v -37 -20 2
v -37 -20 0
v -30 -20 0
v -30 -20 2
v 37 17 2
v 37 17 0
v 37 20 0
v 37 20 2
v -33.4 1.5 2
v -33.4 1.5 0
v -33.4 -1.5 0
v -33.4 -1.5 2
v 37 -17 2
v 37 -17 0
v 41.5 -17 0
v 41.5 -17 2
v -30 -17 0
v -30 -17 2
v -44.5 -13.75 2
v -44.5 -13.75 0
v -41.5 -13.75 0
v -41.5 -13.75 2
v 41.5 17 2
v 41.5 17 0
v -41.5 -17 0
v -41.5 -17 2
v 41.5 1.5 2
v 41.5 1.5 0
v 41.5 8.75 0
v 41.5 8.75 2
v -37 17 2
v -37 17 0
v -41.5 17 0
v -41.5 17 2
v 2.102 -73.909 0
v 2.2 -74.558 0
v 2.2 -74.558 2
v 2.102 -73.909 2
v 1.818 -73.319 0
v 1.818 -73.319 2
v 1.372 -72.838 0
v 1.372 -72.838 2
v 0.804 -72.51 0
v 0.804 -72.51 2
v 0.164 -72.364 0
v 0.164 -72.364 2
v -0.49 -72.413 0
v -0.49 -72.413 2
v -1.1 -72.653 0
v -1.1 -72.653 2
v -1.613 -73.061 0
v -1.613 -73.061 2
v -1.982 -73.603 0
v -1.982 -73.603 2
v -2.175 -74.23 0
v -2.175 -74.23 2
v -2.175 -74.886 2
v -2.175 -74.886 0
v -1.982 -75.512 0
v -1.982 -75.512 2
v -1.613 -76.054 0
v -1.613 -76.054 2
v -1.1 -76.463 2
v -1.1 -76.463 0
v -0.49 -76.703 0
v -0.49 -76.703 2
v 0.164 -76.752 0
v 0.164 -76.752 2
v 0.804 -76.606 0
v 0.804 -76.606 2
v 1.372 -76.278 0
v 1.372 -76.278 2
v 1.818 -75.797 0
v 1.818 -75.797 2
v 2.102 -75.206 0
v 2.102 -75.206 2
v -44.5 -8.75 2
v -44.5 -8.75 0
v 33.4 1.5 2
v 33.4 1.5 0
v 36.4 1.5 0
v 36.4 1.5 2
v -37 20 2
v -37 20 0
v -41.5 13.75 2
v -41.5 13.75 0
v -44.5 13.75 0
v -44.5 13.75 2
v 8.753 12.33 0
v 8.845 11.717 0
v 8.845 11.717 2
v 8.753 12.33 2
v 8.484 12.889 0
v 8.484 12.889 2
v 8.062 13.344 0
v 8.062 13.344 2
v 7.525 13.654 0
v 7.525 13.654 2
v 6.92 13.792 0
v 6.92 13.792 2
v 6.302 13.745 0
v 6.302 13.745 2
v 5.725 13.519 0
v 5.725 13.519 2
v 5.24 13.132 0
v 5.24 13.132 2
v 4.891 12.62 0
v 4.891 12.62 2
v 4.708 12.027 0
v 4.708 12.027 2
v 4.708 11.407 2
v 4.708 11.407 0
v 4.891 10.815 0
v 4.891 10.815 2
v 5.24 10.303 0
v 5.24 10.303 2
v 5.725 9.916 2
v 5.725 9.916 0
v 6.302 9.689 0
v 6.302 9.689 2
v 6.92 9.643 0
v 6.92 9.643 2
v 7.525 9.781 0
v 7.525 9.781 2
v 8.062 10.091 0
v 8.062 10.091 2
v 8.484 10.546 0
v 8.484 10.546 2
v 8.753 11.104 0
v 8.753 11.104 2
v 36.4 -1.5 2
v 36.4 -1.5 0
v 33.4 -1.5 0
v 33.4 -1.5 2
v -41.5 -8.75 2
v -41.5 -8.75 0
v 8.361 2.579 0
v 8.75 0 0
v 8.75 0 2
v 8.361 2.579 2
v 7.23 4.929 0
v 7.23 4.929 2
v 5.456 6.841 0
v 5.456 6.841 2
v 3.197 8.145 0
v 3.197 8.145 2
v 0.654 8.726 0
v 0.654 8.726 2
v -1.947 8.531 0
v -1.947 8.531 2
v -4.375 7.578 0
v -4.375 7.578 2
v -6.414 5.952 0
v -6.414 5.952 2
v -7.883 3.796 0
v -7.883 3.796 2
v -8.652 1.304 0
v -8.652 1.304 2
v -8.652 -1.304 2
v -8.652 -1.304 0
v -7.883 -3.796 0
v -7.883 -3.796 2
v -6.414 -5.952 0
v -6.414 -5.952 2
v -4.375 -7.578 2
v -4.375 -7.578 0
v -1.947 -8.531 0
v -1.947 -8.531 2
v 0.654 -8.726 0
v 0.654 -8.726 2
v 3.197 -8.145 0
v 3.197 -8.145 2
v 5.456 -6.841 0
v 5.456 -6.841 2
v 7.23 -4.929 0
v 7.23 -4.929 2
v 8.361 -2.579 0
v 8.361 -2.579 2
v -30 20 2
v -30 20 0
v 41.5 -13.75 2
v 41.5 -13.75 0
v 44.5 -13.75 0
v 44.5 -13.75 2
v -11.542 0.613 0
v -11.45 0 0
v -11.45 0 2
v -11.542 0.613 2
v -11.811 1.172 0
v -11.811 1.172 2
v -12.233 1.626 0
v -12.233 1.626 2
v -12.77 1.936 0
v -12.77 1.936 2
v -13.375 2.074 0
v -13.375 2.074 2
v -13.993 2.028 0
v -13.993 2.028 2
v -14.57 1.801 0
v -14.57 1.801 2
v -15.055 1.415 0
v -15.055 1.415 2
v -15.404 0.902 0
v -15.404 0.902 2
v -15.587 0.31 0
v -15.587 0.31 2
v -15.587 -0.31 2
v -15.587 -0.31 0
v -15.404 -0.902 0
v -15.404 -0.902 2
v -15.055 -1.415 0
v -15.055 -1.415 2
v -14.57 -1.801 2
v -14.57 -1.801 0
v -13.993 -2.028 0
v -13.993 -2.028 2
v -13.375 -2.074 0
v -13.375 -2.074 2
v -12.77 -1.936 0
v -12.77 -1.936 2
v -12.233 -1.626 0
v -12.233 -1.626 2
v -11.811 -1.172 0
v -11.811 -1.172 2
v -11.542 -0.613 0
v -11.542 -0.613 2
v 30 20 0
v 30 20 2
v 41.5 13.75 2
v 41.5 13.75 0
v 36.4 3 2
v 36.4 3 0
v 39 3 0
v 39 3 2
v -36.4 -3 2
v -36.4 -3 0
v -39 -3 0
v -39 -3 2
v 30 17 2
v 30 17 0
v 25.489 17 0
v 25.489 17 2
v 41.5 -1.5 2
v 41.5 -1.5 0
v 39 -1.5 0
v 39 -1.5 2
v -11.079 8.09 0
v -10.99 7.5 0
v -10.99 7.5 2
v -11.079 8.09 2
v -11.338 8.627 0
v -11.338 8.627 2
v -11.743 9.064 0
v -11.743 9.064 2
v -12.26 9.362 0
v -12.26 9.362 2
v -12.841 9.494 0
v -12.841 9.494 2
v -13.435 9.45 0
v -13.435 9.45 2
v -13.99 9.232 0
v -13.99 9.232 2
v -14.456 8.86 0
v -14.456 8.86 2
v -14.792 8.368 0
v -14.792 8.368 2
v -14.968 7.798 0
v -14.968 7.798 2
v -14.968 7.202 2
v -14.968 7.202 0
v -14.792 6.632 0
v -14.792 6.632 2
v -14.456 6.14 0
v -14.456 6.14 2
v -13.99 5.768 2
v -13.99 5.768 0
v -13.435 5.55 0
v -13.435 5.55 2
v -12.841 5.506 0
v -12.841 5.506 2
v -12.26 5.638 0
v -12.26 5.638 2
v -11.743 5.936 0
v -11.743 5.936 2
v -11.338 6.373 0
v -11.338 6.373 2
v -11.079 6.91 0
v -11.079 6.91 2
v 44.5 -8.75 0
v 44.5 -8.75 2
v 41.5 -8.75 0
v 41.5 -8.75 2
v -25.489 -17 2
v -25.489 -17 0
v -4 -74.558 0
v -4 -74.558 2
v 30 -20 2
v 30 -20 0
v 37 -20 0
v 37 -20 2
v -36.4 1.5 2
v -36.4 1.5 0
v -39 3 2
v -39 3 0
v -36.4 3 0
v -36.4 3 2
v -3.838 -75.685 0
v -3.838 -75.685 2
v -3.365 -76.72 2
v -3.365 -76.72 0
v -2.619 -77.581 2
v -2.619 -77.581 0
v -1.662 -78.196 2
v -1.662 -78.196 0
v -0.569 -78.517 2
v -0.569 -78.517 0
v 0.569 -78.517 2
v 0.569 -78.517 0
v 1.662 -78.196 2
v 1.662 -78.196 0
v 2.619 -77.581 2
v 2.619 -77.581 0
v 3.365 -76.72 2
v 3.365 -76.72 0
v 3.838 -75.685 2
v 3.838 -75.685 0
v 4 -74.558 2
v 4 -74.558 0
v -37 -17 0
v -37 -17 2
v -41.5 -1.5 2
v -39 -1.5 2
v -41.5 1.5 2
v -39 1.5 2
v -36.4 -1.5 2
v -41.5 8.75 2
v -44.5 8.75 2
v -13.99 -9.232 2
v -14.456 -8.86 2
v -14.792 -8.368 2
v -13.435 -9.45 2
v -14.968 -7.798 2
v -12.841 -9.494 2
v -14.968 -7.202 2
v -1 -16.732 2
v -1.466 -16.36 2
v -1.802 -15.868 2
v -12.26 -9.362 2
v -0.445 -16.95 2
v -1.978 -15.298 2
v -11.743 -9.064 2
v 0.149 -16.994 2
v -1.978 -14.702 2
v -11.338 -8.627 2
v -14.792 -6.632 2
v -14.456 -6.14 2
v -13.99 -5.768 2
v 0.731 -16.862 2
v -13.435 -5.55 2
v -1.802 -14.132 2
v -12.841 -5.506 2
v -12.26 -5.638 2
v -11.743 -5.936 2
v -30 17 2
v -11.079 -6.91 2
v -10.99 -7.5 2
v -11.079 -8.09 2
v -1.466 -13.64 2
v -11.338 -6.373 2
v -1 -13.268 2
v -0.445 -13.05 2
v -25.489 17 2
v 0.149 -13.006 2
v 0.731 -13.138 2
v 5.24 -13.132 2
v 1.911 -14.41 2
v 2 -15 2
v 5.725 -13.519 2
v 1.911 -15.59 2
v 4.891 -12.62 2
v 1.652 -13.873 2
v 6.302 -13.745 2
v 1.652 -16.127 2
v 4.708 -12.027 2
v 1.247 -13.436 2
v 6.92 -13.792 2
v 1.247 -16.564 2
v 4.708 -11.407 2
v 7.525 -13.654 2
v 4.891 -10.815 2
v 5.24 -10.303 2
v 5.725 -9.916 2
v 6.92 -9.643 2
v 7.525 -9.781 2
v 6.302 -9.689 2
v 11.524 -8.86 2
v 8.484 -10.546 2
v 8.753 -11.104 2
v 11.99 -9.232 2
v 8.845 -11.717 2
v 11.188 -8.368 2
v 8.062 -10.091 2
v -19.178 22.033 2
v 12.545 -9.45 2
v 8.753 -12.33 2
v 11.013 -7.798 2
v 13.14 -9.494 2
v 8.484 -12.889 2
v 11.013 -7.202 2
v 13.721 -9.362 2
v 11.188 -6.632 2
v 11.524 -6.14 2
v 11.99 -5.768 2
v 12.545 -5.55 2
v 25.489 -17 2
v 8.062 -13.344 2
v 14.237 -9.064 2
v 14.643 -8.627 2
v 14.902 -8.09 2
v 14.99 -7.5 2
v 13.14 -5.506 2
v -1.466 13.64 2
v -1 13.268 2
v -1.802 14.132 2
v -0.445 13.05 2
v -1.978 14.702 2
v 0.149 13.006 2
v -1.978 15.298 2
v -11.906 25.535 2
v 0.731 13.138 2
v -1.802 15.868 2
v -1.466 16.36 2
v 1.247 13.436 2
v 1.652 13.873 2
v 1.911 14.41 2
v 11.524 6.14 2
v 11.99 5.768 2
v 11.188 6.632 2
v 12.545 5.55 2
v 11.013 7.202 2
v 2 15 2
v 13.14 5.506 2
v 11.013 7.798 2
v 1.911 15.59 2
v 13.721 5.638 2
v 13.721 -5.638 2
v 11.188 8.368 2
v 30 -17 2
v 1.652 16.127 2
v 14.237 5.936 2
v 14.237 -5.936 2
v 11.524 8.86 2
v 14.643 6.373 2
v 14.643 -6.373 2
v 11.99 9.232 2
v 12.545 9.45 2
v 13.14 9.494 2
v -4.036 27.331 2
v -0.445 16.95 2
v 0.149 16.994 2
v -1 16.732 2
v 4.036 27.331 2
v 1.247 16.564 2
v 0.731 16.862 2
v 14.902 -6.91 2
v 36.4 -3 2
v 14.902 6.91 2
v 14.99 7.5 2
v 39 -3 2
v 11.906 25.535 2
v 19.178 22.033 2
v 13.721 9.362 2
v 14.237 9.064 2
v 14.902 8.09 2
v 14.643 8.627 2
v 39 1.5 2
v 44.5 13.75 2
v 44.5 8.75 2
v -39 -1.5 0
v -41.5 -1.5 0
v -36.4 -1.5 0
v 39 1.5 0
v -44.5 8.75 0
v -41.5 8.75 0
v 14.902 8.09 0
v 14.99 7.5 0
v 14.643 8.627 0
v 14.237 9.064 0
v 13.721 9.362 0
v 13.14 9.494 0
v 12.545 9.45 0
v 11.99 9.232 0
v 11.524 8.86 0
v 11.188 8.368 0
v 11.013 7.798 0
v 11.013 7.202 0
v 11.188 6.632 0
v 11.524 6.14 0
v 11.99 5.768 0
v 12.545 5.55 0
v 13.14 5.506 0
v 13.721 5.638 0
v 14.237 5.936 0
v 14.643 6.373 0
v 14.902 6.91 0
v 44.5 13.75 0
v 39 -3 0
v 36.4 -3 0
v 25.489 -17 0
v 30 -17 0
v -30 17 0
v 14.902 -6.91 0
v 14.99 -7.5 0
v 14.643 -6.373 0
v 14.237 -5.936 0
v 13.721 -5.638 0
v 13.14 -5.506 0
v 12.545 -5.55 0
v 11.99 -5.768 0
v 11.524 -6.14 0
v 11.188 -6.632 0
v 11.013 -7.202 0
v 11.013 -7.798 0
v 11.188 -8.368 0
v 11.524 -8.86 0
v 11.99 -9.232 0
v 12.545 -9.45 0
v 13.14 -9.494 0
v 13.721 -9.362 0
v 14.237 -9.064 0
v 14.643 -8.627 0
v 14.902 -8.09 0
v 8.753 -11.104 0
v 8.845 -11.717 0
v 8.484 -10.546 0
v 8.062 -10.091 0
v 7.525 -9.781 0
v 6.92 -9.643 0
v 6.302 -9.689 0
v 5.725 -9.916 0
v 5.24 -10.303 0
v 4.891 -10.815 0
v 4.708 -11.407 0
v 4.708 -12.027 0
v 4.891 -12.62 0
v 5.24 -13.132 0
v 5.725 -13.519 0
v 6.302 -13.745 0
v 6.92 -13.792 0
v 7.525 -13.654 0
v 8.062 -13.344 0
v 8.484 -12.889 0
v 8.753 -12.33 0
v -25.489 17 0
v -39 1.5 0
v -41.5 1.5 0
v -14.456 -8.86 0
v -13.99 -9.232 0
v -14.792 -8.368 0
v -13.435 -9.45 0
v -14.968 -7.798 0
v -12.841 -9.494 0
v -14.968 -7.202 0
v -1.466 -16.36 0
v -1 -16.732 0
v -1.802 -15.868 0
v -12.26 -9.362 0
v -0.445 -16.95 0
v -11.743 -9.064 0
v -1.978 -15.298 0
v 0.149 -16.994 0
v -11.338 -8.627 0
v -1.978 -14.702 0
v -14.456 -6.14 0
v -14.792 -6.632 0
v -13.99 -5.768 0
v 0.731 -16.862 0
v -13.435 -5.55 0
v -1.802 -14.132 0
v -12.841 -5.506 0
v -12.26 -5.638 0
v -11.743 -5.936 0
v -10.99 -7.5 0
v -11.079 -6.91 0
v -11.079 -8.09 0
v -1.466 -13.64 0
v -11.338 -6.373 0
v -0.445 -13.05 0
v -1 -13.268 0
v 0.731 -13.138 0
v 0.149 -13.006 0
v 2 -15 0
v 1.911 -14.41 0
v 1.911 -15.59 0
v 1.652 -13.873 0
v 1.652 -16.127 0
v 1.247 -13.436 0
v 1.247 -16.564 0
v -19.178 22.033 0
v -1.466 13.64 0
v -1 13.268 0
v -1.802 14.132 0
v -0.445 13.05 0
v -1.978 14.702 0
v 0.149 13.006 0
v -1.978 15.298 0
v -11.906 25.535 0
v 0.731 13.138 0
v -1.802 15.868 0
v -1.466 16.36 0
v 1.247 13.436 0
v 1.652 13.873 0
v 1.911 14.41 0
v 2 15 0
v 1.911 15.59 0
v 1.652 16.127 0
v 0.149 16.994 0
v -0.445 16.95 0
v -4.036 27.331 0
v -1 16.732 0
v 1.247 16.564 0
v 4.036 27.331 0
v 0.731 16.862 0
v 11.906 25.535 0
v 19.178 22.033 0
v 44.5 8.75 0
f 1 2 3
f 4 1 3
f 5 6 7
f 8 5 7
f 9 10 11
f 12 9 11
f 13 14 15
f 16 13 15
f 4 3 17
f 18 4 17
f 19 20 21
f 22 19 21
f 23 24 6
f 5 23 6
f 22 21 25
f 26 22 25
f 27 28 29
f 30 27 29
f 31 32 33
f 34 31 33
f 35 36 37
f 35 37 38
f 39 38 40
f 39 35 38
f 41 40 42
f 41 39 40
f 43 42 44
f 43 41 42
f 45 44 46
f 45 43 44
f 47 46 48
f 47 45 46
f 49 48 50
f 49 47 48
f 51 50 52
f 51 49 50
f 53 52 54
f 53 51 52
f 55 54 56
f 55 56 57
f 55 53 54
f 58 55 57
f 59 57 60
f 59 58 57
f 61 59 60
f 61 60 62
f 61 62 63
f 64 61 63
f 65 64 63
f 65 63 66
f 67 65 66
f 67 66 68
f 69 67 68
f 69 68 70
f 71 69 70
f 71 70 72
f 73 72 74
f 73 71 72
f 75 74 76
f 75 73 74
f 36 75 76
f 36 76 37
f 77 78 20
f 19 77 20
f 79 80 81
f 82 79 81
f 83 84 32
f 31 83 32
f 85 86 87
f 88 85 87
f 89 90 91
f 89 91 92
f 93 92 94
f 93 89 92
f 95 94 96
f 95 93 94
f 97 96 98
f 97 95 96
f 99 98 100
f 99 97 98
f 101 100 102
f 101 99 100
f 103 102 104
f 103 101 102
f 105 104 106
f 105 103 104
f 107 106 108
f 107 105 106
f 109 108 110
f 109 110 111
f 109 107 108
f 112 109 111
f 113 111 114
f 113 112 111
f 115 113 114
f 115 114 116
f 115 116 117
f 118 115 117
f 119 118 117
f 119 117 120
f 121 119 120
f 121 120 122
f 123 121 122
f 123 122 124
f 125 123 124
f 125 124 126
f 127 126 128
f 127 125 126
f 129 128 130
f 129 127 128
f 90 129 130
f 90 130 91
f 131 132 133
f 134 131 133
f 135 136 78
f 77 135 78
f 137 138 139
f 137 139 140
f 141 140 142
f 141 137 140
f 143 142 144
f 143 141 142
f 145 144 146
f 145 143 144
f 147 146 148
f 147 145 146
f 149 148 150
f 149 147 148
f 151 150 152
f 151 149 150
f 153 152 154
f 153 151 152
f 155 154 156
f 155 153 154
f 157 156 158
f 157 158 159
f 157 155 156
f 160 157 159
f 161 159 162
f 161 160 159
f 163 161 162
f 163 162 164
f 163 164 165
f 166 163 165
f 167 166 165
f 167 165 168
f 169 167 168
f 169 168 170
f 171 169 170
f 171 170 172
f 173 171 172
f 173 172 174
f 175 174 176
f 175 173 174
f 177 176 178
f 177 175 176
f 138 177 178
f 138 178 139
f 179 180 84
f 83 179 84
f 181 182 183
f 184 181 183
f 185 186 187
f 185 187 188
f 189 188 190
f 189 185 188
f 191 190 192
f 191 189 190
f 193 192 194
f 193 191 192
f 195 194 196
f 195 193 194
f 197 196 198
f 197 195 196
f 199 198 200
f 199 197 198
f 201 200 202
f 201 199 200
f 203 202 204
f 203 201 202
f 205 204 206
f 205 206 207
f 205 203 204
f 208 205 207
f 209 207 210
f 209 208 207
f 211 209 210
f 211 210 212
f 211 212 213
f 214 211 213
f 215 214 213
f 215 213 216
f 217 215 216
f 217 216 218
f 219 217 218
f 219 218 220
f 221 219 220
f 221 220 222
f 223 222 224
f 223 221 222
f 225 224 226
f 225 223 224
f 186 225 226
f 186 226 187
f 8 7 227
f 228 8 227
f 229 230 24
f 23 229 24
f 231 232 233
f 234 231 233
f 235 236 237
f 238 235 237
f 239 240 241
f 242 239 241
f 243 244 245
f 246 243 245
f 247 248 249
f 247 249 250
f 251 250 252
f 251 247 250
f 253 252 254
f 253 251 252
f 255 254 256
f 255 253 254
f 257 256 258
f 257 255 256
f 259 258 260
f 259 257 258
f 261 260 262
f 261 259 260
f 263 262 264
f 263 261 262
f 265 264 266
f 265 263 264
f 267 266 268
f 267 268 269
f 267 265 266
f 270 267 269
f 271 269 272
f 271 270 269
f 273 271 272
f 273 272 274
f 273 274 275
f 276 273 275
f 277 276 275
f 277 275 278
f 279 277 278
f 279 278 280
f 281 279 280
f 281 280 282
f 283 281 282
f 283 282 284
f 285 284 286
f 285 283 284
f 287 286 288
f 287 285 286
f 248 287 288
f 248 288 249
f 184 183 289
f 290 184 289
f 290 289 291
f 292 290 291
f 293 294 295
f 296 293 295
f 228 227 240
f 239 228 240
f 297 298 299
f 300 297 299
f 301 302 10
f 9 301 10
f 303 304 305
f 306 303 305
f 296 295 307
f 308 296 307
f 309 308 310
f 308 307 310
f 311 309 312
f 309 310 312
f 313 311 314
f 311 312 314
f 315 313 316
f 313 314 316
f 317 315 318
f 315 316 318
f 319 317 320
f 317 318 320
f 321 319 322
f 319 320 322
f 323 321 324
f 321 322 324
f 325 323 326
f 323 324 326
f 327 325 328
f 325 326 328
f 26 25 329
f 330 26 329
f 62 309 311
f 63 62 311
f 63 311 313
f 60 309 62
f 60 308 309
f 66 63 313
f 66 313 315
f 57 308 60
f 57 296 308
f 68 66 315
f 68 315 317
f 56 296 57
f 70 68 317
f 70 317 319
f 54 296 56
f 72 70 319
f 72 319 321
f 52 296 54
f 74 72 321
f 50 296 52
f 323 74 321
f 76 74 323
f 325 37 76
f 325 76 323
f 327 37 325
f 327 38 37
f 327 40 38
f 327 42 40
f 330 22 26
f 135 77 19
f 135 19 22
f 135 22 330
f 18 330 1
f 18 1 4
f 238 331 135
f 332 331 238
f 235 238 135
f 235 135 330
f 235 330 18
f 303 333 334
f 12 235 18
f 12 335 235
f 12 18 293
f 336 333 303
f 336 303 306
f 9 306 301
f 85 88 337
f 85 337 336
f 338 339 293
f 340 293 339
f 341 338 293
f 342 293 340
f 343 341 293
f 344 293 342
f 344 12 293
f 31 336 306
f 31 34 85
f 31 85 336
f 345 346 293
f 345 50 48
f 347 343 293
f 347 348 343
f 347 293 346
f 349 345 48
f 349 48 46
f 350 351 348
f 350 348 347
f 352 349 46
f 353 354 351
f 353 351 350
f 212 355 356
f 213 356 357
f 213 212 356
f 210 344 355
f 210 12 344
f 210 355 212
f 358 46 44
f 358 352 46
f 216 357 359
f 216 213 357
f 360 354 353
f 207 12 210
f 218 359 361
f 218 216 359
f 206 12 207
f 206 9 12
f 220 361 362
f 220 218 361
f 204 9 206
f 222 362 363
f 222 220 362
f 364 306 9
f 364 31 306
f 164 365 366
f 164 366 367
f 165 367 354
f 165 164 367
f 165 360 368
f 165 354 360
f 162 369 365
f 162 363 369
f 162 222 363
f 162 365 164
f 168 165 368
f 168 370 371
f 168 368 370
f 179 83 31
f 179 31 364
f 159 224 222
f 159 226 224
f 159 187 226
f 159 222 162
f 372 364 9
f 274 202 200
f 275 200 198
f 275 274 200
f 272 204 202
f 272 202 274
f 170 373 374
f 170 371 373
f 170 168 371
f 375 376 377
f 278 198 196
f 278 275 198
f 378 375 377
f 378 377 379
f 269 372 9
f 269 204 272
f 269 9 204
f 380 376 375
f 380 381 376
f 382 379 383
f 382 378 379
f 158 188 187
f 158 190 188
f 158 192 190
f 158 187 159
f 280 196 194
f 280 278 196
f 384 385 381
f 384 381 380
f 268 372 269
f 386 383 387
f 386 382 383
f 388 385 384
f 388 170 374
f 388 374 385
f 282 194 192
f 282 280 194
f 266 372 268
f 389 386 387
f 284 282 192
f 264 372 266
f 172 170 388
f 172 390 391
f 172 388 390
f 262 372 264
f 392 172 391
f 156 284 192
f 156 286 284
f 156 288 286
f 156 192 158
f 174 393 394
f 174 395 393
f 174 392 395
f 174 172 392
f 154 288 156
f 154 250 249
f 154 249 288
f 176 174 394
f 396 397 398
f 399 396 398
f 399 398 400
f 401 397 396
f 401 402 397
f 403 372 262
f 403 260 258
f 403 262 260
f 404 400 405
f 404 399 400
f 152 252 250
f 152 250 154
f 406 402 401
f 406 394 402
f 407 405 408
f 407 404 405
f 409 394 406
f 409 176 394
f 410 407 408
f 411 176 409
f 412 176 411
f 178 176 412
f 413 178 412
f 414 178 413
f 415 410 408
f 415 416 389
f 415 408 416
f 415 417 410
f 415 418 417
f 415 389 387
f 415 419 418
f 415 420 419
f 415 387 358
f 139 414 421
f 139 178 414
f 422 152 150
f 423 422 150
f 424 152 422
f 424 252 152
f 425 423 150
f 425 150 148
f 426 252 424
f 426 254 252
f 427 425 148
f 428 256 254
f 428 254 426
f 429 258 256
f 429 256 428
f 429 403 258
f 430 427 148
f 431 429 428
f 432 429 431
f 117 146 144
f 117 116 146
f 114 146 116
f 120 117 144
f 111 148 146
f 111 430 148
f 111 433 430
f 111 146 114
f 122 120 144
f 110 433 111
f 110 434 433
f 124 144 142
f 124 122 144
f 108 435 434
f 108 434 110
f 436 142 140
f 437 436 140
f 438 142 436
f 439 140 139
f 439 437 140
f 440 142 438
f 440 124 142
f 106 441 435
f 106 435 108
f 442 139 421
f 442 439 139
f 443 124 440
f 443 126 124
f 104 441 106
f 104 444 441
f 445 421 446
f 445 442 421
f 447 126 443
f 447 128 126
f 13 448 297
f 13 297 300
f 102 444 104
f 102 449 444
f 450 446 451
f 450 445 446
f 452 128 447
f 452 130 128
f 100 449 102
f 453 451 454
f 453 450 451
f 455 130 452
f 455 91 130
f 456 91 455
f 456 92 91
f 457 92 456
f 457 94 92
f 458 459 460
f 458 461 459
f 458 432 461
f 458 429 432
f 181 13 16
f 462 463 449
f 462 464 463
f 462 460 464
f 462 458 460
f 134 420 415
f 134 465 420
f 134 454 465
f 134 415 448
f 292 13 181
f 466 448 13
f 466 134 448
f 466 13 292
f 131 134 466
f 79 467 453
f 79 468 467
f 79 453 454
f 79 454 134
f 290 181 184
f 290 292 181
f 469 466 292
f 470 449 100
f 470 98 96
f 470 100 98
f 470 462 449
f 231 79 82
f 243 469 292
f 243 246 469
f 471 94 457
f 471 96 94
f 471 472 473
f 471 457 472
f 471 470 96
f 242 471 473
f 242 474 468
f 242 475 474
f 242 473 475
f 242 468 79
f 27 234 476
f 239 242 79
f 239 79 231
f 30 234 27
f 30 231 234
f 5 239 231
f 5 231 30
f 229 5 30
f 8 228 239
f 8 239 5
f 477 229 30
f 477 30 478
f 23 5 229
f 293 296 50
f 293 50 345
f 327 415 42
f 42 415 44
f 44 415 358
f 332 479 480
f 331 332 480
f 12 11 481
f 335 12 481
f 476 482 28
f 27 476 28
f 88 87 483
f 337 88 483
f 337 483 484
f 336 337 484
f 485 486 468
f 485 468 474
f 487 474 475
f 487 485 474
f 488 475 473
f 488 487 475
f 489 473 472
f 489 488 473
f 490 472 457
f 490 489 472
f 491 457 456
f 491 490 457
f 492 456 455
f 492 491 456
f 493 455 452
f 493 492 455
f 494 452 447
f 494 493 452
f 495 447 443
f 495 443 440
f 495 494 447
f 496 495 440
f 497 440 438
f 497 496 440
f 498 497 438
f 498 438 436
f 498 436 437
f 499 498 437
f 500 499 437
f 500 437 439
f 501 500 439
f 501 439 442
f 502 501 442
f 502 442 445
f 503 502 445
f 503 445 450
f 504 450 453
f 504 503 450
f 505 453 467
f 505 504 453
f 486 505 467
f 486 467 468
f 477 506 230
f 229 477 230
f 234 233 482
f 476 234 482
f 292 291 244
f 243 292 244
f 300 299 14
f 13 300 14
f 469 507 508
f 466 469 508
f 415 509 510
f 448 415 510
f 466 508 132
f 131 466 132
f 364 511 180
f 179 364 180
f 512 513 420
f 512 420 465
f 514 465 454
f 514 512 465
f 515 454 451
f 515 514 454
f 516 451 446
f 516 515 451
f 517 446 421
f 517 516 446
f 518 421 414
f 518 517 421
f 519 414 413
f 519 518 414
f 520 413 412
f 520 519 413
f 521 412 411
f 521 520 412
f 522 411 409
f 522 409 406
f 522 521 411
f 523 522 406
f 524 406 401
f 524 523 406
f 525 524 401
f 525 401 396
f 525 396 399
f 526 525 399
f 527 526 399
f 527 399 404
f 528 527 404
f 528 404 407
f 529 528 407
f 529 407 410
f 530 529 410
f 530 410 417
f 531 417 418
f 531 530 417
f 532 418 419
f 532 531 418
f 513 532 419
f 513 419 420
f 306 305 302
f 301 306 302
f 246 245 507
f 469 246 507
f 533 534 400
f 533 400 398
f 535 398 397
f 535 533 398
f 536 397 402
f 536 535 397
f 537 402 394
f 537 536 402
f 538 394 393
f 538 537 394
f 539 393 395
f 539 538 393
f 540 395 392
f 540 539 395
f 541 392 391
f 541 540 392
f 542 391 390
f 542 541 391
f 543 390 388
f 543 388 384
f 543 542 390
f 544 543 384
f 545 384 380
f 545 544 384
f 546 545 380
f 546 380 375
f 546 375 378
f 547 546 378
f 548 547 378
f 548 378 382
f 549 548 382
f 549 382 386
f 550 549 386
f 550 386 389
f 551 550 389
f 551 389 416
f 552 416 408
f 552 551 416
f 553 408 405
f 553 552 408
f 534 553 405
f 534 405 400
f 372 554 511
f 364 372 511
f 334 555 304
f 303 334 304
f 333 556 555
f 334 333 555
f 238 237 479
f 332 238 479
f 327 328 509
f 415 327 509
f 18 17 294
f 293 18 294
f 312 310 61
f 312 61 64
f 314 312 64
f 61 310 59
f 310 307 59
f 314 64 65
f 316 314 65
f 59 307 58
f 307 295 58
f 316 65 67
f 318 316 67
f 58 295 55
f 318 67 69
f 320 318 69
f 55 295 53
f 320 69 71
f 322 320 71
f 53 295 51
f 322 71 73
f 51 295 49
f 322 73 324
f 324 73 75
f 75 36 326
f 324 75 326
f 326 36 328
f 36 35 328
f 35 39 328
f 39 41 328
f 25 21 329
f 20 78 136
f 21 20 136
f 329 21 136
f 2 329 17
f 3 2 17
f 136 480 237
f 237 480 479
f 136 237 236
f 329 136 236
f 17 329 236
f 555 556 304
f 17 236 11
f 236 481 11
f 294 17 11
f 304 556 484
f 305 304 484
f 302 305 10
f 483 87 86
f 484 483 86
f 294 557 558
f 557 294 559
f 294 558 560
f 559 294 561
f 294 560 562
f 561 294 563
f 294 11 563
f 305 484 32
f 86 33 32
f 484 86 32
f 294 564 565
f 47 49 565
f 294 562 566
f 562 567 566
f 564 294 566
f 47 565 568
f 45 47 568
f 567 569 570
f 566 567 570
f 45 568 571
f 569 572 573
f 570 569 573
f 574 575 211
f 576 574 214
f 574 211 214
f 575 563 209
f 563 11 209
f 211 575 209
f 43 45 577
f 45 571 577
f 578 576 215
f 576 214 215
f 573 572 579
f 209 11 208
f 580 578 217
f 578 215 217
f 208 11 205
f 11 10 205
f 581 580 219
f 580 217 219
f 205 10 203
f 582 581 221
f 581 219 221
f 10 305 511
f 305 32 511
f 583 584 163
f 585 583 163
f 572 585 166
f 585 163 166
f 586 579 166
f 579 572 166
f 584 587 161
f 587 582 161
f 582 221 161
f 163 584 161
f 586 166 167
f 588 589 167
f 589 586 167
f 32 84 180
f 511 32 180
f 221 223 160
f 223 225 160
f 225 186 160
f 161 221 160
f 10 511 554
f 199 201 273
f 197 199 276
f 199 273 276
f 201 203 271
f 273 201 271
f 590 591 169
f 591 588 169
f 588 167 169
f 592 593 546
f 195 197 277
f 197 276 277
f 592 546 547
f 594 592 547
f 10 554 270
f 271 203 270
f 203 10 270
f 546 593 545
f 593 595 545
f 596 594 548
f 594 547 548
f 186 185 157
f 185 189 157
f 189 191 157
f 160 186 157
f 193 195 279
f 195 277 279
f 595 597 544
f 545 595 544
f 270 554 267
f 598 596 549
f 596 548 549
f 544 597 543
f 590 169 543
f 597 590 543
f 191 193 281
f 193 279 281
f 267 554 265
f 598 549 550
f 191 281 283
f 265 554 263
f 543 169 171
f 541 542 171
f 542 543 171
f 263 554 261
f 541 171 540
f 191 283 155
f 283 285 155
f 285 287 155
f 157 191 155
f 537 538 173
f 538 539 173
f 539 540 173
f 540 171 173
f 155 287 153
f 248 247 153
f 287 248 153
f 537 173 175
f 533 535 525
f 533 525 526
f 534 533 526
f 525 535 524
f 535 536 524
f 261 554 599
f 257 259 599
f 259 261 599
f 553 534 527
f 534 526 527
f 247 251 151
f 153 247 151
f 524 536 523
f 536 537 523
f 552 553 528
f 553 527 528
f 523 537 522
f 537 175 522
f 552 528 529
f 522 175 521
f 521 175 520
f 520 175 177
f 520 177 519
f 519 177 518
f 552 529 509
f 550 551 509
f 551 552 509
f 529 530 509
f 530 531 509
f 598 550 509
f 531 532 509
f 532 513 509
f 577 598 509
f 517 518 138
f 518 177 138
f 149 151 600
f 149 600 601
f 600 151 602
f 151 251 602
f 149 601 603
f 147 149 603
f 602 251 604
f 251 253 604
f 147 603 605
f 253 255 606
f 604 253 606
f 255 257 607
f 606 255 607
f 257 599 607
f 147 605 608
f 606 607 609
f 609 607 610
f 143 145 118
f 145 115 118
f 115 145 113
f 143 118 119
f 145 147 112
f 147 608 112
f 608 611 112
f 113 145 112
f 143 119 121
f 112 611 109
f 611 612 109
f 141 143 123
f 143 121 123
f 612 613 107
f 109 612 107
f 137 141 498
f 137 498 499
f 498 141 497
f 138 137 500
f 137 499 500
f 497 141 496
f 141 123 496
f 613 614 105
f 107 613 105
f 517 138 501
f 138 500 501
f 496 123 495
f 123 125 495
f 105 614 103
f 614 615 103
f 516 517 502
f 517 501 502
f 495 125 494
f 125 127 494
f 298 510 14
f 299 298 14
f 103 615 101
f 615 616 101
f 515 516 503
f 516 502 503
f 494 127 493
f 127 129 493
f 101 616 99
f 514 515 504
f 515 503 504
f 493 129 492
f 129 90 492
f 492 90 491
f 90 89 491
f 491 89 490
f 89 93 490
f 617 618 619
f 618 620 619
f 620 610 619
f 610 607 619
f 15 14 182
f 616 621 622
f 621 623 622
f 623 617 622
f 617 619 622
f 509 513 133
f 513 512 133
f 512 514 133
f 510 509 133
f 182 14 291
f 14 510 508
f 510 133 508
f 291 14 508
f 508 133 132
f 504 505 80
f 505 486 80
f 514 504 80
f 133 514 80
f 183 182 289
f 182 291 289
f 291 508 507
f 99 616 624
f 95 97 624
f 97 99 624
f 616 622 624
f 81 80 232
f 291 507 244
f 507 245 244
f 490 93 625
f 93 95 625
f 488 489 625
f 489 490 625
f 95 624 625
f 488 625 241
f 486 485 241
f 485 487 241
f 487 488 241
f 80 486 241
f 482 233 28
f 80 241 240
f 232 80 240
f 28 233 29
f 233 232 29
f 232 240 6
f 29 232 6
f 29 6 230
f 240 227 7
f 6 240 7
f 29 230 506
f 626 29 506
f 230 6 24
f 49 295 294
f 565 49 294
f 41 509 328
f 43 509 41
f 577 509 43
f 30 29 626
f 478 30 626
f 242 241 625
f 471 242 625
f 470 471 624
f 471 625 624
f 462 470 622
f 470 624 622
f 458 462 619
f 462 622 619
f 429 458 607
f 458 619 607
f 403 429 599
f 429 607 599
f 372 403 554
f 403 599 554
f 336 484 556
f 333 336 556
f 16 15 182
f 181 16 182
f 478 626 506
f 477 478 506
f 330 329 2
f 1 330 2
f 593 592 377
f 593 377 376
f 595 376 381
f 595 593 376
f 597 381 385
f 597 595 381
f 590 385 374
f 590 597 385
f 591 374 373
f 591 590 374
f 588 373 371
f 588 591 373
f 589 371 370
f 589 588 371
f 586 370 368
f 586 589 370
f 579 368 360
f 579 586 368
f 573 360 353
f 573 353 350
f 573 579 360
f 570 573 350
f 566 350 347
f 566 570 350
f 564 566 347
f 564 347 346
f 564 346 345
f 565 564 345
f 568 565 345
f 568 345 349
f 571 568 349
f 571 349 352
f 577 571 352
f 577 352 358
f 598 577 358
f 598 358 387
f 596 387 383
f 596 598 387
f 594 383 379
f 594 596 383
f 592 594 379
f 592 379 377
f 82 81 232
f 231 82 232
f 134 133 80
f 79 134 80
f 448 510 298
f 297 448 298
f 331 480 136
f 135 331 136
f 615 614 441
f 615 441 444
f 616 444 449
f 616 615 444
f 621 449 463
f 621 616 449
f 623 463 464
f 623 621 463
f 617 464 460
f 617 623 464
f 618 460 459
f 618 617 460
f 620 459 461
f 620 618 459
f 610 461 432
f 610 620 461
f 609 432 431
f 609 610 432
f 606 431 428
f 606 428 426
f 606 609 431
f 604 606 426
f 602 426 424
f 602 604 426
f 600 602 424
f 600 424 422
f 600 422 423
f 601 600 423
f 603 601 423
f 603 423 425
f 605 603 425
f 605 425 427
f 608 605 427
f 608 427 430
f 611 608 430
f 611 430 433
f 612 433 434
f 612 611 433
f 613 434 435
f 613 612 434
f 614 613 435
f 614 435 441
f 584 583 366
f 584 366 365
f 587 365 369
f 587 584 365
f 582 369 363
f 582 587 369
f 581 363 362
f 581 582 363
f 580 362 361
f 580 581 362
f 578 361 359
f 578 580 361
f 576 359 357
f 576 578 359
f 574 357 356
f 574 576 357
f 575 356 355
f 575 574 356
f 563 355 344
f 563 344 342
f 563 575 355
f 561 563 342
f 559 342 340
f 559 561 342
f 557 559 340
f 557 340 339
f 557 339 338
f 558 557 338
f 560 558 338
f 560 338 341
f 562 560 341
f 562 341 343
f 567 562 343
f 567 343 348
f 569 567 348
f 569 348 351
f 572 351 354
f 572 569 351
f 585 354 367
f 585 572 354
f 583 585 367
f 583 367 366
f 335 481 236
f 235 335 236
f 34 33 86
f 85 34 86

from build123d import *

# Parameters (mm, degrees)
SKETCH_1_R      = 2
SKETCH_1_R_2    = 2.08
SKETCH_1_R_3    = 8.75
SKETCH_1_R_4    = 2.2
EXTRUDE_2_DEPTH = 2


with BuildPart() as part:
    # 草图1 → 凸台-拉伸2 (new body)
    with BuildSketch(Plane.XY):
        with BuildLine():
            Line((41.5, 13.75), (41.5, 17))
            Line((41.5, 17), (37, 17))
            Line((37, 17), (37, 20))
            Line((37, 20), (30, 20))
            Line((30, 20), (30, 17))
            Line((30, 17), (25.488968202, 17))
            ThreePointArc((25.488968202, 17), (0, 27.55787632), (-25.488968202, 17))
            Line((-25.488968202, 17), (-30, 17))
            Line((-30, 17), (-30, 20))
            Line((-30, 20), (-37, 20))
            Line((-37, 20), (-37, 17))
            Line((-37, 17), (-41.5, 17))
            Line((-41.5, 17), (-41.5, 13.75))
            Line((-41.5, 13.75), (-44.5, 13.75))
            Line((-44.5, 13.75), (-44.5, 8.75))
            Line((-44.5, 8.75), (-41.5, 8.75))
            Line((-41.5, 8.75), (-41.5, 1.5))
            Line((-41.5, 1.5), (-39, 1.5))
            Line((-39, 1.5), (-39, 3))
            Line((-39, 3), (-36.4, 3))
            Line((-36.4, 3), (-36.4, 1.5))
            Line((-36.4, 1.5), (-33.4, 1.5))
            Line((-33.4, 1.5), (-33.4, -1.5))
            Line((-33.4, -1.5), (-36.4, -1.5))
            Line((-36.4, -1.5), (-36.4, -3))
            Line((-36.4, -3), (-39, -3))
            Line((-39, -3), (-39, -1.5))
            Line((-39, -1.5), (-41.5, -1.5))
            Line((-41.5, -1.5), (-41.5, -8.75))
            Line((-41.5, -8.75), (-44.5, -8.75))
            Line((-44.5, -8.75), (-44.5, -13.75))
            Line((-44.5, -13.75), (-41.5, -13.75))
            Line((-41.5, -13.75), (-41.5, -17))
            Line((-41.5, -17), (-37, -17))
            Line((-37, -17), (-37, -20))
            Line((-37, -20), (-30, -20))
            Line((-30, -20), (-30, -17))
            Line((-30, -17), (-25.488968202, -17))
            Line((-25.488968202, -17), (-4, -74.55787632))
            ThreePointArc((-4, -74.55787632), (0, -78.55787632), (4, -74.55787632))
            Line((4, -74.55787632), (25.488968202, -17))
            Line((25.488968202, -17), (30, -17))
            Line((30, -17), (30, -20))
            Line((30, -20), (37, -20))
            Line((37, -20), (37, -17))
            Line((37, -17), (41.5, -17))
            Line((41.5, -17), (41.5, -13.75))
            Line((41.5, -13.75), (44.5, -13.75))
            Line((44.5, -13.75), (44.5, -8.75))
            Line((44.5, -8.75), (41.5, -8.75))
            Line((41.5, -8.75), (41.5, -1.5))
            Line((41.5, -1.5), (39, -1.5))
            Line((39, -1.5), (39, -3))
            Line((39, -3), (36.4, -3))
            Line((36.4, -3), (36.4, -1.5))
            Line((36.4, -1.5), (33.4, -1.5))
            Line((33.4, -1.5), (33.4, 1.5))
            Line((33.4, 1.5), (36.4, 1.5))
            Line((36.4, 1.5), (36.4, 3))
            Line((36.4, 3), (39, 3))
            Line((39, 3), (39, 1.5))
            Line((39, 1.5), (41.5, 1.5))
            Line((41.5, 1.5), (41.5, 8.75))
            Line((41.5, 8.75), (44.5, 8.75))
            Line((44.5, 8.75), (44.5, 13.75))
            Line((44.5, 13.75), (41.5, 13.75))
        make_face()
        with Locations((0, -15)):
            Circle(SKETCH_1_R, mode=Mode.SUBTRACT)
        with Locations((-12.990381057, -7.5)):
            Circle(SKETCH_1_R, mode=Mode.SUBTRACT)
        with Locations((-12.990381057, 7.5)):
            Circle(SKETCH_1_R, mode=Mode.SUBTRACT)
        with Locations((0, 15)):
            Circle(SKETCH_1_R, mode=Mode.SUBTRACT)
        with Locations((12.990381057, 7.5)):
            Circle(SKETCH_1_R, mode=Mode.SUBTRACT)
        with Locations((12.990381057, -7.5)):
            Circle(SKETCH_1_R, mode=Mode.SUBTRACT)
        with Locations((-13.53, 0)):
            Circle(SKETCH_1_R_2, mode=Mode.SUBTRACT)
        with Locations((6.765, 11.717323713)):
            Circle(SKETCH_1_R_2, mode=Mode.SUBTRACT)
        with Locations((6.765, -11.717323713)):
            Circle(SKETCH_1_R_2, mode=Mode.SUBTRACT)
        Circle(SKETCH_1_R_3, mode=Mode.SUBTRACT)
        with Locations((0, -74.55787632)):
            Circle(SKETCH_1_R_4, mode=Mode.SUBTRACT)
    extrude(amount=EXTRUDE_2_DEPTH)


solid = part.part
